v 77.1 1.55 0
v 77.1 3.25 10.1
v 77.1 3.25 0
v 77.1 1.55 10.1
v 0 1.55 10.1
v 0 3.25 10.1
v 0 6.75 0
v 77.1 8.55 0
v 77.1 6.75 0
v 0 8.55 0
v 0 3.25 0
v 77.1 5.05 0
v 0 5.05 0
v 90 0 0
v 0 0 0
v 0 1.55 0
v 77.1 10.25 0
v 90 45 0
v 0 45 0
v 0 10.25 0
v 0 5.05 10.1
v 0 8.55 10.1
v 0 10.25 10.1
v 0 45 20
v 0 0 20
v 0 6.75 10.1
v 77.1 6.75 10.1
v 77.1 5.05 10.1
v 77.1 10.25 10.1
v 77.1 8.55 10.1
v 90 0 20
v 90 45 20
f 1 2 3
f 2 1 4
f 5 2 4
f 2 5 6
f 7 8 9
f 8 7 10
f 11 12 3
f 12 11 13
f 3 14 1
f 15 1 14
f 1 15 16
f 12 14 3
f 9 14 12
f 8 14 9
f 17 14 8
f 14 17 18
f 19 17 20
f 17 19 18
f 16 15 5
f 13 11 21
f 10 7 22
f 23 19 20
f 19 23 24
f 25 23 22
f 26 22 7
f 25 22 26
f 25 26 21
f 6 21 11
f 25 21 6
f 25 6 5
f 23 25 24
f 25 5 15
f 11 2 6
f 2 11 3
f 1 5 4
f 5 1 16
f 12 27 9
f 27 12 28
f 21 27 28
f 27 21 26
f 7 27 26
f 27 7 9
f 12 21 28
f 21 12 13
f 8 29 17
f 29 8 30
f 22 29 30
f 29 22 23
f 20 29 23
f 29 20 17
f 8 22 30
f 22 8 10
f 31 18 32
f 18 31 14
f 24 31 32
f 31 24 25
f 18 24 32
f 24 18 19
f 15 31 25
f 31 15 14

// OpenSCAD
$fn = 128;

// --- Dimensions ---
// Base block dimensions
base_length_X = 90;
base_width_Y = 45;
base_height_Z = 20;

// Slide dimensions (mm)
slide_length = 75;
slide_width = 25;
slide_thickness = 1;

// Slot dimensions
slot_length = 77;
slot_width = 1.6;
slot_depth = 10;

// Slot spacing and positioning
slot_spacing = 3.5; // Centre-to-centre in Y
num_slots = 10;

// --- Calculation ---
// Calculate the Y position of the first slot to center the group on the block (Y=0)
// Total width occupied by slots = num_slots * slot_width
// Total spacing between slots = (num_slots - 1) * slot_spacing
// Total group width = (num_slots * slot_width) + ((num_slots - 1) * slot_spacing)
// The group is centered at Y=0.
// First slot center Y = - (Total group width / 2) + (slot_width / 2)

total_group_width = (num_slots * slot_width) + ((num_slots - 1) * slot_spacing);
first_slot_center_Y = -(total_group_width / 2) + (slot_width / 2);

// --- Build ---

difference() {
    // 1. Create the solid base block
    // Centered on origin, resting on Z=0
    translate([0, 0, 0])
        cube([base_length_X, base_width_Y, base_height_Z]);

    // 2. Cut the 10 parallel slots
    // Slots run along X, so they are extruded in X direction.
    // We use a for loop to position them along Y.
    for (i = [0 : num_slots - 1]) {
        // Calculate Y position for current slot
        current_slot_Y = first_slot_center_Y + (i * slot_spacing);
        
        // Define the cutting shape
        // The slot is 77mm long (X), 1.6mm wide (Y), 10mm deep (Z)
        // We extend slightly past the faces (0.1mm) to ensure clean cut
        // Extending past the block edges in X/Y ensures the cut goes all the way through
        cut_length = slot_length + 0.1;
        cut_width = slot_width + 0.1;
        cut_depth = slot_depth + 0.1;
        
        translate([0, current_slot_Y, 0])
            cube([cut_length, cut_width, cut_depth]);
    }
}
